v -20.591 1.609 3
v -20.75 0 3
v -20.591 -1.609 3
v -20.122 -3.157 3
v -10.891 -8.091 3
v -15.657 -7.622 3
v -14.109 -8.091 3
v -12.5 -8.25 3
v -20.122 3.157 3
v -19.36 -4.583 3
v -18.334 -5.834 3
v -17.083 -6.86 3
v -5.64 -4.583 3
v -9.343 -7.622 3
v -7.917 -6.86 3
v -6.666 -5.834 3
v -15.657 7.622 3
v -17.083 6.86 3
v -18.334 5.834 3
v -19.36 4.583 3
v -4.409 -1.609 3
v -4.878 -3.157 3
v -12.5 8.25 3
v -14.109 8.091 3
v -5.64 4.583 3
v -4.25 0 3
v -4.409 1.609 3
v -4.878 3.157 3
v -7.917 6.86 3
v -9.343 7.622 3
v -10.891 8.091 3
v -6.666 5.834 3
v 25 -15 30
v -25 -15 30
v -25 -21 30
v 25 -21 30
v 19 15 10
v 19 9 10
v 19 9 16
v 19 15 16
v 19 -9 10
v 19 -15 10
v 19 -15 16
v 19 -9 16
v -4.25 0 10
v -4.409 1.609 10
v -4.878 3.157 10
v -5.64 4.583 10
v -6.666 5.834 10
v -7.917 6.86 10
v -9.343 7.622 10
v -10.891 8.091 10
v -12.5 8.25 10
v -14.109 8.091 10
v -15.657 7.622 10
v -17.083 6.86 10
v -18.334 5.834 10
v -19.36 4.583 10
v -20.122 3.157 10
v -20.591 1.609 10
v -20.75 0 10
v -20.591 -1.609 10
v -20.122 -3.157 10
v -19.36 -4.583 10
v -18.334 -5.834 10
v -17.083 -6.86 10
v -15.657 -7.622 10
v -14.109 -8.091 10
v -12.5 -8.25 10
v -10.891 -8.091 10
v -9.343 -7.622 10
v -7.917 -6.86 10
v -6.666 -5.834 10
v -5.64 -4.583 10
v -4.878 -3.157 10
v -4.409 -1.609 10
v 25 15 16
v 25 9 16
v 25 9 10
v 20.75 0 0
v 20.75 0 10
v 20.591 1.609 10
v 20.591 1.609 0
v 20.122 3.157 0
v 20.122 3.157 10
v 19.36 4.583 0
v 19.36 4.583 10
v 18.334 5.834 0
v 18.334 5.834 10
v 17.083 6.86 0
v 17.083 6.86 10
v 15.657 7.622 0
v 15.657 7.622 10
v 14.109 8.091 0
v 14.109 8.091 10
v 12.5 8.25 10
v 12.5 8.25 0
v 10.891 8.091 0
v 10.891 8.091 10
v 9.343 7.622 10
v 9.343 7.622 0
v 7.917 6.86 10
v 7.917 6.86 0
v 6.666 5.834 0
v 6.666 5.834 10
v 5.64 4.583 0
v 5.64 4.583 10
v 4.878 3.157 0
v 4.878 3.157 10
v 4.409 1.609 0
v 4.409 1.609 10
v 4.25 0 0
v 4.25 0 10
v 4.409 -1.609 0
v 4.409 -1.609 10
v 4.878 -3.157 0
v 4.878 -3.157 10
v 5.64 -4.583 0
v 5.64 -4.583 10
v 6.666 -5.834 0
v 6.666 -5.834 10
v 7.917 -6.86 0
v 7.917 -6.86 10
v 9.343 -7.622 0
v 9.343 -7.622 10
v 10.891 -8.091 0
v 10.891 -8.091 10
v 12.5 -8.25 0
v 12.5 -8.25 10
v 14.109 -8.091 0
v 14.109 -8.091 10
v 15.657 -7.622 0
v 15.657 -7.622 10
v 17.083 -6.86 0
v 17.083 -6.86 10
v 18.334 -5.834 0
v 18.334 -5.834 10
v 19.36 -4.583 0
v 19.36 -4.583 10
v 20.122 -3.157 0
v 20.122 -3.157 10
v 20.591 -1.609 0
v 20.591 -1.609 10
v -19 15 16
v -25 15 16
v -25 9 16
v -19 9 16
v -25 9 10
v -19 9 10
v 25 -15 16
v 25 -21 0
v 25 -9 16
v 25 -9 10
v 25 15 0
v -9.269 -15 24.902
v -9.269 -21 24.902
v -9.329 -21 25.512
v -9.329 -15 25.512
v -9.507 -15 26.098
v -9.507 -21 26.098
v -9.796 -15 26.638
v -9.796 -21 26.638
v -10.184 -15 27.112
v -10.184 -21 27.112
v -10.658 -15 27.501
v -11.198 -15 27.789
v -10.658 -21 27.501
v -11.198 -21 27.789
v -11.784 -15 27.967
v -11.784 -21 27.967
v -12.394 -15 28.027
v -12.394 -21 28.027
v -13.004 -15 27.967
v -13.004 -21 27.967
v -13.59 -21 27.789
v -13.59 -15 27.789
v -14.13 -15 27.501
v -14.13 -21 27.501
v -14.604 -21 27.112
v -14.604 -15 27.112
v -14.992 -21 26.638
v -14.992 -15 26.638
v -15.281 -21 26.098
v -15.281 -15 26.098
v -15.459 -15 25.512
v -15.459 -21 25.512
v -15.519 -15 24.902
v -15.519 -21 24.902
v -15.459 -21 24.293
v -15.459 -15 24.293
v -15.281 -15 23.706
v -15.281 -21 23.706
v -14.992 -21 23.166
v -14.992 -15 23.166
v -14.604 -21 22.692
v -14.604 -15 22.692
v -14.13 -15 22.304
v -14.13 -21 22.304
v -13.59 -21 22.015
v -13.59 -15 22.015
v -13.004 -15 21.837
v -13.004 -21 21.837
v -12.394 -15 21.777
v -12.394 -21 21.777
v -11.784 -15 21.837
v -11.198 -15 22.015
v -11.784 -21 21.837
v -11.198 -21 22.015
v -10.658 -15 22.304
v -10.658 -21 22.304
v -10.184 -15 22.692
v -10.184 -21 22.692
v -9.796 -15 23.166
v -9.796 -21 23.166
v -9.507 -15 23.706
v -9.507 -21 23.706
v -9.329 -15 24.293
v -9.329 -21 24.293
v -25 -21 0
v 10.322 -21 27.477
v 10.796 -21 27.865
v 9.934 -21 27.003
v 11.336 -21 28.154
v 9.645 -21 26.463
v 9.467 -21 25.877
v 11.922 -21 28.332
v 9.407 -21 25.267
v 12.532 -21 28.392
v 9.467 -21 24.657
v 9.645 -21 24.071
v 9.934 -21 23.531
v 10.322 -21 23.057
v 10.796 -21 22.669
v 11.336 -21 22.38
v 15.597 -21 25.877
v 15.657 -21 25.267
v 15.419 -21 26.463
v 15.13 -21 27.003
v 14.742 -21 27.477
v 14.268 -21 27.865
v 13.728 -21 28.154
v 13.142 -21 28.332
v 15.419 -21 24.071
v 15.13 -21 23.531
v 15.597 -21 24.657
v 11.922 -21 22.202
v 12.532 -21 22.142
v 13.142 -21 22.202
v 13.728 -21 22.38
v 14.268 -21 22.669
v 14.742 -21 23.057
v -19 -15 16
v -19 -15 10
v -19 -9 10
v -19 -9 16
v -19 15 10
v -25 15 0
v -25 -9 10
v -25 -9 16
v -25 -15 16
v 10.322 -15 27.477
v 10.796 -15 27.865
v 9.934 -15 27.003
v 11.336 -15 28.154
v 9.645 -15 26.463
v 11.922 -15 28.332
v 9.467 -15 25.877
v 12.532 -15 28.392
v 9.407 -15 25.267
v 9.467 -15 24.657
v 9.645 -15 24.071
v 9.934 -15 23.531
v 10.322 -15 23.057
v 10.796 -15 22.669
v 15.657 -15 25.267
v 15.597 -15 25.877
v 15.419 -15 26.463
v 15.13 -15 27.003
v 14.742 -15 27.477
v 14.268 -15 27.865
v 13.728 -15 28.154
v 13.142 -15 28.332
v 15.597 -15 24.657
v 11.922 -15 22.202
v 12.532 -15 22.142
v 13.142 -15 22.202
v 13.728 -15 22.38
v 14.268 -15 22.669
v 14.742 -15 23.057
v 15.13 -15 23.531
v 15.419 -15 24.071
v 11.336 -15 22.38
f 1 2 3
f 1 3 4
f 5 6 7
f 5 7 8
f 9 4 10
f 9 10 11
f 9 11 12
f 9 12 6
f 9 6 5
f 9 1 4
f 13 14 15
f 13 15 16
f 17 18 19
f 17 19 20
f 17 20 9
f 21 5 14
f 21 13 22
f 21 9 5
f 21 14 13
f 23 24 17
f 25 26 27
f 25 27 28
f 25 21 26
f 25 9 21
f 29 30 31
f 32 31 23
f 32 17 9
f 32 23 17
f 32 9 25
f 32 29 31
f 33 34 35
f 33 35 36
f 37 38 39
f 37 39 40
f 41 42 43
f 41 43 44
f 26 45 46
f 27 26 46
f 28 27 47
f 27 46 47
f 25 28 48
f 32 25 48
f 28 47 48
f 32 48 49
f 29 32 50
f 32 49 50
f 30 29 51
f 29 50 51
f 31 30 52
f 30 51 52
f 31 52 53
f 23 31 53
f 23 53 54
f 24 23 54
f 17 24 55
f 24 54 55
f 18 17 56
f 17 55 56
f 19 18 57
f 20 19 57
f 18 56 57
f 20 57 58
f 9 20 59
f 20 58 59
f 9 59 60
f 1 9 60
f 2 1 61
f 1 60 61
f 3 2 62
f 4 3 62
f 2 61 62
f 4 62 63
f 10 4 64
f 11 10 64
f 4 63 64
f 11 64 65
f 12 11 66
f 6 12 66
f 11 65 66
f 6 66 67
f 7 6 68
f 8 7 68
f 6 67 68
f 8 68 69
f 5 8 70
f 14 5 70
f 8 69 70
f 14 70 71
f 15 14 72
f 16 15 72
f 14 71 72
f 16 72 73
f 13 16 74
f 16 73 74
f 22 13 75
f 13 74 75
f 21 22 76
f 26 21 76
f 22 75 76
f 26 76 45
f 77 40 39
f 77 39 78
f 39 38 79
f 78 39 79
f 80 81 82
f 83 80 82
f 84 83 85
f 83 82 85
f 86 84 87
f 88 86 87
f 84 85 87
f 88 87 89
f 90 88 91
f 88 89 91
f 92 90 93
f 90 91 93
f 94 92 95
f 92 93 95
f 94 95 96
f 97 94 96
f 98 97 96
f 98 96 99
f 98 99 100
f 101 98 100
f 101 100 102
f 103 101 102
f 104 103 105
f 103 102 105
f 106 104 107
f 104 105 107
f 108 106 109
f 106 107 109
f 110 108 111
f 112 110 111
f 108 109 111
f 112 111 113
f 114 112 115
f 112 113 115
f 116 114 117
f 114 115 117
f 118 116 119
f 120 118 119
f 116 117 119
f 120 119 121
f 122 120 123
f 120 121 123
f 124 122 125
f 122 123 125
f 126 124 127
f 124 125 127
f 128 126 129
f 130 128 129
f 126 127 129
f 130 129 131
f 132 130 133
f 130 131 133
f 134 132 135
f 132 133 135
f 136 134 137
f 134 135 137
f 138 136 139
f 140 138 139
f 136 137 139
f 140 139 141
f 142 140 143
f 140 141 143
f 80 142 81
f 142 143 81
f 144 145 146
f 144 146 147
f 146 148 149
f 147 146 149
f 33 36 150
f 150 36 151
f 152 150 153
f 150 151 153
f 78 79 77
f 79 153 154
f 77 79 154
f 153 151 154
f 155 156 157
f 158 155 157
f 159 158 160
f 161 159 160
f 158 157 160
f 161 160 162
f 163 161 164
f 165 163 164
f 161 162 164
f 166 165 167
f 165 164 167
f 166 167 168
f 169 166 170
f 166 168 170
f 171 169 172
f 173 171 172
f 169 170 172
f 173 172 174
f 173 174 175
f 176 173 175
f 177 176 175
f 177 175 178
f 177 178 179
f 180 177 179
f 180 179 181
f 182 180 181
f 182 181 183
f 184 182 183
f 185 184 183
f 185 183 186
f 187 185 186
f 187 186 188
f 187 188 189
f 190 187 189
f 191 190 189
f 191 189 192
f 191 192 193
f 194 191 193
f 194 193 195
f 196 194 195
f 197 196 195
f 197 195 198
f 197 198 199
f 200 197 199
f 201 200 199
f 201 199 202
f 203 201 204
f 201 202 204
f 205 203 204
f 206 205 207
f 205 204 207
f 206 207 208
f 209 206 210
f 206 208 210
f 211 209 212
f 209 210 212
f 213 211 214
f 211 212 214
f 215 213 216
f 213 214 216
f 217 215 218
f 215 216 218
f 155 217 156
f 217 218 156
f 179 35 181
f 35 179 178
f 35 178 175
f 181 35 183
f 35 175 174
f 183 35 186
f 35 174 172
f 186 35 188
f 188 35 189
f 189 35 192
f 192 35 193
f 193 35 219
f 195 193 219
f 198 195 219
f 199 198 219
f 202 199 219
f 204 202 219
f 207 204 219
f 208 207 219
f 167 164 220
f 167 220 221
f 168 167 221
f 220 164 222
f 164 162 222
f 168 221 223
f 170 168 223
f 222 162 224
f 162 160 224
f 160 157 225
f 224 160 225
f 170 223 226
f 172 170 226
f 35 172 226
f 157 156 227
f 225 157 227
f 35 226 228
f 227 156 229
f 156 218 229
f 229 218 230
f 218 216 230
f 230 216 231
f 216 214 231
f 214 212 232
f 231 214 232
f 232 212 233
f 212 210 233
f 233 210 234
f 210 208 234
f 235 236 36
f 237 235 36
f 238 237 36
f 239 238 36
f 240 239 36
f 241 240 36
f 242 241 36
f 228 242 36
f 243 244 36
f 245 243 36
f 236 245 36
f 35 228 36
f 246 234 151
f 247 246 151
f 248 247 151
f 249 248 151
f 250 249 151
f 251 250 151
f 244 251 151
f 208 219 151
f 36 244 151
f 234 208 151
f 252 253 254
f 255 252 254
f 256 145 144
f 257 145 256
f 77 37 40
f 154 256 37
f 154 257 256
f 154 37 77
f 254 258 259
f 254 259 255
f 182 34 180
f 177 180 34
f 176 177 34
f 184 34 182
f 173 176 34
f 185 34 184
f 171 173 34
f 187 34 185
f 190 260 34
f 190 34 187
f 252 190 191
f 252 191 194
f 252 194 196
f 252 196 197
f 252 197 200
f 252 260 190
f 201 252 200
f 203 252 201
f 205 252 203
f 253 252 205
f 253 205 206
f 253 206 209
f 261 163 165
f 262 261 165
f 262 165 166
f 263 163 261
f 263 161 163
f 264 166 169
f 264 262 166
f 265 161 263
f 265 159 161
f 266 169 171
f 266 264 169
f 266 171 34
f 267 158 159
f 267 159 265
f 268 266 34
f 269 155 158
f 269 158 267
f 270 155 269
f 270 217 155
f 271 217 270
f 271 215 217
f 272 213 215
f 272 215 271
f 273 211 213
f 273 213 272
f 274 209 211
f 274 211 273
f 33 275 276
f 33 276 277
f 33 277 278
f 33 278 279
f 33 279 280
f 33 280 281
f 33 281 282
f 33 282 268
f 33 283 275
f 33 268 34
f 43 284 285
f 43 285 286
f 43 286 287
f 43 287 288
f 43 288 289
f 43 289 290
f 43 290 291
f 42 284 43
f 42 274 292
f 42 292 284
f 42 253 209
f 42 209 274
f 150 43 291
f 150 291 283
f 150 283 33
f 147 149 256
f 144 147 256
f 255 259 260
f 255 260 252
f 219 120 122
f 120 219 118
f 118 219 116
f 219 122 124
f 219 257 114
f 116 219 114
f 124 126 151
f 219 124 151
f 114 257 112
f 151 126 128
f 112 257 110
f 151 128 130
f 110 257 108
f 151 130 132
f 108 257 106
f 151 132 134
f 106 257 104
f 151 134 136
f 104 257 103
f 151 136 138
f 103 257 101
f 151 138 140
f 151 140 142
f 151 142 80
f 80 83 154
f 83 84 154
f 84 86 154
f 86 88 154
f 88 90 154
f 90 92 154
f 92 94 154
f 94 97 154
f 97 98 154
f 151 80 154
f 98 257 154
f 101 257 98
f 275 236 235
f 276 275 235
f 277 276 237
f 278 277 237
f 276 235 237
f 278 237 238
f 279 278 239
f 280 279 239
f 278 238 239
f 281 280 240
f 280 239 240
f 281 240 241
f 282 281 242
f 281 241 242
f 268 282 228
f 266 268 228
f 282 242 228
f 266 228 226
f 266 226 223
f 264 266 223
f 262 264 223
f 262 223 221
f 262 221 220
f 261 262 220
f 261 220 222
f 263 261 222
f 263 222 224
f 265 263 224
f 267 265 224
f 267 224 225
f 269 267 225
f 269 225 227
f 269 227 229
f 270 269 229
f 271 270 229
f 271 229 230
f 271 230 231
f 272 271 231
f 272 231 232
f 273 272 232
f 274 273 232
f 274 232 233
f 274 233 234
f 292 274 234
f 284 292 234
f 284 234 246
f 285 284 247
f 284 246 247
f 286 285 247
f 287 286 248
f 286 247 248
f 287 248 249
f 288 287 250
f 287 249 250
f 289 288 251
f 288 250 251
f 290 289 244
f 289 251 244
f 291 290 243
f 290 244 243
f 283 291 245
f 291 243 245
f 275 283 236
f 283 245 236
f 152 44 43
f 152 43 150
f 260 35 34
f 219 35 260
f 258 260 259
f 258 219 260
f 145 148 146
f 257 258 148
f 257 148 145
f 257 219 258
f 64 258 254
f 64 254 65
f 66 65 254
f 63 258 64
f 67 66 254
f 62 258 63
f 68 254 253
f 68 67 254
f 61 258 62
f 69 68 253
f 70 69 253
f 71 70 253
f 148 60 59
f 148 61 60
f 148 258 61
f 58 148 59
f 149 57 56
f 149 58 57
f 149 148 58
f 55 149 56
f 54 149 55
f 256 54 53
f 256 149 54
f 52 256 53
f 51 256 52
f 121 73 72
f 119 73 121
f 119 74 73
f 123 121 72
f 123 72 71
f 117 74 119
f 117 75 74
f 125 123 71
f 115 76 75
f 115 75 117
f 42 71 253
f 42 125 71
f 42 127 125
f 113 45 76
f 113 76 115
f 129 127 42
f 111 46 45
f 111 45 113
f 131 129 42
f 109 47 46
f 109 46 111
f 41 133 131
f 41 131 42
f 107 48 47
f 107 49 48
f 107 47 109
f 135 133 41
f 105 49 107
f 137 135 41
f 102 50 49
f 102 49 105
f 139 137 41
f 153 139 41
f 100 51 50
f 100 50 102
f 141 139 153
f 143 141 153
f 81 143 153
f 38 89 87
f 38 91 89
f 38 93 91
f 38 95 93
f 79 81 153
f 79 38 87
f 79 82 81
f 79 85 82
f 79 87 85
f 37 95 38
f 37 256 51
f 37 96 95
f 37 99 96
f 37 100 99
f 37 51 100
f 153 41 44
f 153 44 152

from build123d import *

# Parameters (mm, degrees)
F6_W      = 50
F6_H      = 6
F7_DEPTH  = 30
F0_W      = 50
F0_H      = 30
F8_DEPTH  = 10
F1_W      = 6
F1_H      = 6
F2_W      = 6
F2_H      = 6
F11_DEPTH = 16
F13_R     = 3.125
F14_DEPTH = 10
F9_R      = 8.25
F15_DEPTH = 7
F10_R     = 8.25
F16_DEPTH = 10


with BuildPart() as f7:
    # F6 (on Top) → F7 (new body)
    with BuildSketch(Plane.XY):
        with Locations((0, -18)):
            Rectangle(F6_W, F6_H)
    extrude(amount=F7_DEPTH)

    # F0 (on Top) → F8 (join)
    with BuildSketch(Plane.XY):
        Rectangle(F0_W, F0_H)
    extrude(amount=F8_DEPTH)

    # F1 (on Top) + F2 (on Top) → F11 (join)
    with BuildSketch(Plane.XY):
        with Locations((-22, 12)):
            Rectangle(F1_W, F1_H)
    with BuildSketch(Plane.XY):
        with Locations((22, 12)):
            Rectangle(F2_W, F2_H)
        with Locations((22, -12)):
            Rectangle(F2_W, F2_H)
        with Locations((-22, -12)):
            Rectangle(F2_W, F2_H)
    extrude(amount=F11_DEPTH)

    # F13 (on face) → F14 (cut)
    with BuildSketch(Plane.XZ.offset(21)):
        with Locations((-12.3940734193, 24.9021667987)):
            Circle(F13_R)
        with Locations((12.5320926309, 25.2671018243)):
            Circle(F13_R)
    extrude(amount=-F14_DEPTH, mode=Mode.SUBTRACT)

    # F9 (on face) → F15 (cut)
    with BuildSketch(Plane.XY.offset(10)):
        with Locations((-12.5, 0)):
            Circle(F9_R)
    extrude(amount=-F15_DEPTH, mode=Mode.SUBTRACT)

    # F10 (on face) → F16 (cut)
    with BuildSketch(Plane.XY.offset(10)):
        with Locations((12.5, 0)):
            Circle(F10_R)
    extrude(amount=-F16_DEPTH, mode=Mode.SUBTRACT)


solid = f7.part
